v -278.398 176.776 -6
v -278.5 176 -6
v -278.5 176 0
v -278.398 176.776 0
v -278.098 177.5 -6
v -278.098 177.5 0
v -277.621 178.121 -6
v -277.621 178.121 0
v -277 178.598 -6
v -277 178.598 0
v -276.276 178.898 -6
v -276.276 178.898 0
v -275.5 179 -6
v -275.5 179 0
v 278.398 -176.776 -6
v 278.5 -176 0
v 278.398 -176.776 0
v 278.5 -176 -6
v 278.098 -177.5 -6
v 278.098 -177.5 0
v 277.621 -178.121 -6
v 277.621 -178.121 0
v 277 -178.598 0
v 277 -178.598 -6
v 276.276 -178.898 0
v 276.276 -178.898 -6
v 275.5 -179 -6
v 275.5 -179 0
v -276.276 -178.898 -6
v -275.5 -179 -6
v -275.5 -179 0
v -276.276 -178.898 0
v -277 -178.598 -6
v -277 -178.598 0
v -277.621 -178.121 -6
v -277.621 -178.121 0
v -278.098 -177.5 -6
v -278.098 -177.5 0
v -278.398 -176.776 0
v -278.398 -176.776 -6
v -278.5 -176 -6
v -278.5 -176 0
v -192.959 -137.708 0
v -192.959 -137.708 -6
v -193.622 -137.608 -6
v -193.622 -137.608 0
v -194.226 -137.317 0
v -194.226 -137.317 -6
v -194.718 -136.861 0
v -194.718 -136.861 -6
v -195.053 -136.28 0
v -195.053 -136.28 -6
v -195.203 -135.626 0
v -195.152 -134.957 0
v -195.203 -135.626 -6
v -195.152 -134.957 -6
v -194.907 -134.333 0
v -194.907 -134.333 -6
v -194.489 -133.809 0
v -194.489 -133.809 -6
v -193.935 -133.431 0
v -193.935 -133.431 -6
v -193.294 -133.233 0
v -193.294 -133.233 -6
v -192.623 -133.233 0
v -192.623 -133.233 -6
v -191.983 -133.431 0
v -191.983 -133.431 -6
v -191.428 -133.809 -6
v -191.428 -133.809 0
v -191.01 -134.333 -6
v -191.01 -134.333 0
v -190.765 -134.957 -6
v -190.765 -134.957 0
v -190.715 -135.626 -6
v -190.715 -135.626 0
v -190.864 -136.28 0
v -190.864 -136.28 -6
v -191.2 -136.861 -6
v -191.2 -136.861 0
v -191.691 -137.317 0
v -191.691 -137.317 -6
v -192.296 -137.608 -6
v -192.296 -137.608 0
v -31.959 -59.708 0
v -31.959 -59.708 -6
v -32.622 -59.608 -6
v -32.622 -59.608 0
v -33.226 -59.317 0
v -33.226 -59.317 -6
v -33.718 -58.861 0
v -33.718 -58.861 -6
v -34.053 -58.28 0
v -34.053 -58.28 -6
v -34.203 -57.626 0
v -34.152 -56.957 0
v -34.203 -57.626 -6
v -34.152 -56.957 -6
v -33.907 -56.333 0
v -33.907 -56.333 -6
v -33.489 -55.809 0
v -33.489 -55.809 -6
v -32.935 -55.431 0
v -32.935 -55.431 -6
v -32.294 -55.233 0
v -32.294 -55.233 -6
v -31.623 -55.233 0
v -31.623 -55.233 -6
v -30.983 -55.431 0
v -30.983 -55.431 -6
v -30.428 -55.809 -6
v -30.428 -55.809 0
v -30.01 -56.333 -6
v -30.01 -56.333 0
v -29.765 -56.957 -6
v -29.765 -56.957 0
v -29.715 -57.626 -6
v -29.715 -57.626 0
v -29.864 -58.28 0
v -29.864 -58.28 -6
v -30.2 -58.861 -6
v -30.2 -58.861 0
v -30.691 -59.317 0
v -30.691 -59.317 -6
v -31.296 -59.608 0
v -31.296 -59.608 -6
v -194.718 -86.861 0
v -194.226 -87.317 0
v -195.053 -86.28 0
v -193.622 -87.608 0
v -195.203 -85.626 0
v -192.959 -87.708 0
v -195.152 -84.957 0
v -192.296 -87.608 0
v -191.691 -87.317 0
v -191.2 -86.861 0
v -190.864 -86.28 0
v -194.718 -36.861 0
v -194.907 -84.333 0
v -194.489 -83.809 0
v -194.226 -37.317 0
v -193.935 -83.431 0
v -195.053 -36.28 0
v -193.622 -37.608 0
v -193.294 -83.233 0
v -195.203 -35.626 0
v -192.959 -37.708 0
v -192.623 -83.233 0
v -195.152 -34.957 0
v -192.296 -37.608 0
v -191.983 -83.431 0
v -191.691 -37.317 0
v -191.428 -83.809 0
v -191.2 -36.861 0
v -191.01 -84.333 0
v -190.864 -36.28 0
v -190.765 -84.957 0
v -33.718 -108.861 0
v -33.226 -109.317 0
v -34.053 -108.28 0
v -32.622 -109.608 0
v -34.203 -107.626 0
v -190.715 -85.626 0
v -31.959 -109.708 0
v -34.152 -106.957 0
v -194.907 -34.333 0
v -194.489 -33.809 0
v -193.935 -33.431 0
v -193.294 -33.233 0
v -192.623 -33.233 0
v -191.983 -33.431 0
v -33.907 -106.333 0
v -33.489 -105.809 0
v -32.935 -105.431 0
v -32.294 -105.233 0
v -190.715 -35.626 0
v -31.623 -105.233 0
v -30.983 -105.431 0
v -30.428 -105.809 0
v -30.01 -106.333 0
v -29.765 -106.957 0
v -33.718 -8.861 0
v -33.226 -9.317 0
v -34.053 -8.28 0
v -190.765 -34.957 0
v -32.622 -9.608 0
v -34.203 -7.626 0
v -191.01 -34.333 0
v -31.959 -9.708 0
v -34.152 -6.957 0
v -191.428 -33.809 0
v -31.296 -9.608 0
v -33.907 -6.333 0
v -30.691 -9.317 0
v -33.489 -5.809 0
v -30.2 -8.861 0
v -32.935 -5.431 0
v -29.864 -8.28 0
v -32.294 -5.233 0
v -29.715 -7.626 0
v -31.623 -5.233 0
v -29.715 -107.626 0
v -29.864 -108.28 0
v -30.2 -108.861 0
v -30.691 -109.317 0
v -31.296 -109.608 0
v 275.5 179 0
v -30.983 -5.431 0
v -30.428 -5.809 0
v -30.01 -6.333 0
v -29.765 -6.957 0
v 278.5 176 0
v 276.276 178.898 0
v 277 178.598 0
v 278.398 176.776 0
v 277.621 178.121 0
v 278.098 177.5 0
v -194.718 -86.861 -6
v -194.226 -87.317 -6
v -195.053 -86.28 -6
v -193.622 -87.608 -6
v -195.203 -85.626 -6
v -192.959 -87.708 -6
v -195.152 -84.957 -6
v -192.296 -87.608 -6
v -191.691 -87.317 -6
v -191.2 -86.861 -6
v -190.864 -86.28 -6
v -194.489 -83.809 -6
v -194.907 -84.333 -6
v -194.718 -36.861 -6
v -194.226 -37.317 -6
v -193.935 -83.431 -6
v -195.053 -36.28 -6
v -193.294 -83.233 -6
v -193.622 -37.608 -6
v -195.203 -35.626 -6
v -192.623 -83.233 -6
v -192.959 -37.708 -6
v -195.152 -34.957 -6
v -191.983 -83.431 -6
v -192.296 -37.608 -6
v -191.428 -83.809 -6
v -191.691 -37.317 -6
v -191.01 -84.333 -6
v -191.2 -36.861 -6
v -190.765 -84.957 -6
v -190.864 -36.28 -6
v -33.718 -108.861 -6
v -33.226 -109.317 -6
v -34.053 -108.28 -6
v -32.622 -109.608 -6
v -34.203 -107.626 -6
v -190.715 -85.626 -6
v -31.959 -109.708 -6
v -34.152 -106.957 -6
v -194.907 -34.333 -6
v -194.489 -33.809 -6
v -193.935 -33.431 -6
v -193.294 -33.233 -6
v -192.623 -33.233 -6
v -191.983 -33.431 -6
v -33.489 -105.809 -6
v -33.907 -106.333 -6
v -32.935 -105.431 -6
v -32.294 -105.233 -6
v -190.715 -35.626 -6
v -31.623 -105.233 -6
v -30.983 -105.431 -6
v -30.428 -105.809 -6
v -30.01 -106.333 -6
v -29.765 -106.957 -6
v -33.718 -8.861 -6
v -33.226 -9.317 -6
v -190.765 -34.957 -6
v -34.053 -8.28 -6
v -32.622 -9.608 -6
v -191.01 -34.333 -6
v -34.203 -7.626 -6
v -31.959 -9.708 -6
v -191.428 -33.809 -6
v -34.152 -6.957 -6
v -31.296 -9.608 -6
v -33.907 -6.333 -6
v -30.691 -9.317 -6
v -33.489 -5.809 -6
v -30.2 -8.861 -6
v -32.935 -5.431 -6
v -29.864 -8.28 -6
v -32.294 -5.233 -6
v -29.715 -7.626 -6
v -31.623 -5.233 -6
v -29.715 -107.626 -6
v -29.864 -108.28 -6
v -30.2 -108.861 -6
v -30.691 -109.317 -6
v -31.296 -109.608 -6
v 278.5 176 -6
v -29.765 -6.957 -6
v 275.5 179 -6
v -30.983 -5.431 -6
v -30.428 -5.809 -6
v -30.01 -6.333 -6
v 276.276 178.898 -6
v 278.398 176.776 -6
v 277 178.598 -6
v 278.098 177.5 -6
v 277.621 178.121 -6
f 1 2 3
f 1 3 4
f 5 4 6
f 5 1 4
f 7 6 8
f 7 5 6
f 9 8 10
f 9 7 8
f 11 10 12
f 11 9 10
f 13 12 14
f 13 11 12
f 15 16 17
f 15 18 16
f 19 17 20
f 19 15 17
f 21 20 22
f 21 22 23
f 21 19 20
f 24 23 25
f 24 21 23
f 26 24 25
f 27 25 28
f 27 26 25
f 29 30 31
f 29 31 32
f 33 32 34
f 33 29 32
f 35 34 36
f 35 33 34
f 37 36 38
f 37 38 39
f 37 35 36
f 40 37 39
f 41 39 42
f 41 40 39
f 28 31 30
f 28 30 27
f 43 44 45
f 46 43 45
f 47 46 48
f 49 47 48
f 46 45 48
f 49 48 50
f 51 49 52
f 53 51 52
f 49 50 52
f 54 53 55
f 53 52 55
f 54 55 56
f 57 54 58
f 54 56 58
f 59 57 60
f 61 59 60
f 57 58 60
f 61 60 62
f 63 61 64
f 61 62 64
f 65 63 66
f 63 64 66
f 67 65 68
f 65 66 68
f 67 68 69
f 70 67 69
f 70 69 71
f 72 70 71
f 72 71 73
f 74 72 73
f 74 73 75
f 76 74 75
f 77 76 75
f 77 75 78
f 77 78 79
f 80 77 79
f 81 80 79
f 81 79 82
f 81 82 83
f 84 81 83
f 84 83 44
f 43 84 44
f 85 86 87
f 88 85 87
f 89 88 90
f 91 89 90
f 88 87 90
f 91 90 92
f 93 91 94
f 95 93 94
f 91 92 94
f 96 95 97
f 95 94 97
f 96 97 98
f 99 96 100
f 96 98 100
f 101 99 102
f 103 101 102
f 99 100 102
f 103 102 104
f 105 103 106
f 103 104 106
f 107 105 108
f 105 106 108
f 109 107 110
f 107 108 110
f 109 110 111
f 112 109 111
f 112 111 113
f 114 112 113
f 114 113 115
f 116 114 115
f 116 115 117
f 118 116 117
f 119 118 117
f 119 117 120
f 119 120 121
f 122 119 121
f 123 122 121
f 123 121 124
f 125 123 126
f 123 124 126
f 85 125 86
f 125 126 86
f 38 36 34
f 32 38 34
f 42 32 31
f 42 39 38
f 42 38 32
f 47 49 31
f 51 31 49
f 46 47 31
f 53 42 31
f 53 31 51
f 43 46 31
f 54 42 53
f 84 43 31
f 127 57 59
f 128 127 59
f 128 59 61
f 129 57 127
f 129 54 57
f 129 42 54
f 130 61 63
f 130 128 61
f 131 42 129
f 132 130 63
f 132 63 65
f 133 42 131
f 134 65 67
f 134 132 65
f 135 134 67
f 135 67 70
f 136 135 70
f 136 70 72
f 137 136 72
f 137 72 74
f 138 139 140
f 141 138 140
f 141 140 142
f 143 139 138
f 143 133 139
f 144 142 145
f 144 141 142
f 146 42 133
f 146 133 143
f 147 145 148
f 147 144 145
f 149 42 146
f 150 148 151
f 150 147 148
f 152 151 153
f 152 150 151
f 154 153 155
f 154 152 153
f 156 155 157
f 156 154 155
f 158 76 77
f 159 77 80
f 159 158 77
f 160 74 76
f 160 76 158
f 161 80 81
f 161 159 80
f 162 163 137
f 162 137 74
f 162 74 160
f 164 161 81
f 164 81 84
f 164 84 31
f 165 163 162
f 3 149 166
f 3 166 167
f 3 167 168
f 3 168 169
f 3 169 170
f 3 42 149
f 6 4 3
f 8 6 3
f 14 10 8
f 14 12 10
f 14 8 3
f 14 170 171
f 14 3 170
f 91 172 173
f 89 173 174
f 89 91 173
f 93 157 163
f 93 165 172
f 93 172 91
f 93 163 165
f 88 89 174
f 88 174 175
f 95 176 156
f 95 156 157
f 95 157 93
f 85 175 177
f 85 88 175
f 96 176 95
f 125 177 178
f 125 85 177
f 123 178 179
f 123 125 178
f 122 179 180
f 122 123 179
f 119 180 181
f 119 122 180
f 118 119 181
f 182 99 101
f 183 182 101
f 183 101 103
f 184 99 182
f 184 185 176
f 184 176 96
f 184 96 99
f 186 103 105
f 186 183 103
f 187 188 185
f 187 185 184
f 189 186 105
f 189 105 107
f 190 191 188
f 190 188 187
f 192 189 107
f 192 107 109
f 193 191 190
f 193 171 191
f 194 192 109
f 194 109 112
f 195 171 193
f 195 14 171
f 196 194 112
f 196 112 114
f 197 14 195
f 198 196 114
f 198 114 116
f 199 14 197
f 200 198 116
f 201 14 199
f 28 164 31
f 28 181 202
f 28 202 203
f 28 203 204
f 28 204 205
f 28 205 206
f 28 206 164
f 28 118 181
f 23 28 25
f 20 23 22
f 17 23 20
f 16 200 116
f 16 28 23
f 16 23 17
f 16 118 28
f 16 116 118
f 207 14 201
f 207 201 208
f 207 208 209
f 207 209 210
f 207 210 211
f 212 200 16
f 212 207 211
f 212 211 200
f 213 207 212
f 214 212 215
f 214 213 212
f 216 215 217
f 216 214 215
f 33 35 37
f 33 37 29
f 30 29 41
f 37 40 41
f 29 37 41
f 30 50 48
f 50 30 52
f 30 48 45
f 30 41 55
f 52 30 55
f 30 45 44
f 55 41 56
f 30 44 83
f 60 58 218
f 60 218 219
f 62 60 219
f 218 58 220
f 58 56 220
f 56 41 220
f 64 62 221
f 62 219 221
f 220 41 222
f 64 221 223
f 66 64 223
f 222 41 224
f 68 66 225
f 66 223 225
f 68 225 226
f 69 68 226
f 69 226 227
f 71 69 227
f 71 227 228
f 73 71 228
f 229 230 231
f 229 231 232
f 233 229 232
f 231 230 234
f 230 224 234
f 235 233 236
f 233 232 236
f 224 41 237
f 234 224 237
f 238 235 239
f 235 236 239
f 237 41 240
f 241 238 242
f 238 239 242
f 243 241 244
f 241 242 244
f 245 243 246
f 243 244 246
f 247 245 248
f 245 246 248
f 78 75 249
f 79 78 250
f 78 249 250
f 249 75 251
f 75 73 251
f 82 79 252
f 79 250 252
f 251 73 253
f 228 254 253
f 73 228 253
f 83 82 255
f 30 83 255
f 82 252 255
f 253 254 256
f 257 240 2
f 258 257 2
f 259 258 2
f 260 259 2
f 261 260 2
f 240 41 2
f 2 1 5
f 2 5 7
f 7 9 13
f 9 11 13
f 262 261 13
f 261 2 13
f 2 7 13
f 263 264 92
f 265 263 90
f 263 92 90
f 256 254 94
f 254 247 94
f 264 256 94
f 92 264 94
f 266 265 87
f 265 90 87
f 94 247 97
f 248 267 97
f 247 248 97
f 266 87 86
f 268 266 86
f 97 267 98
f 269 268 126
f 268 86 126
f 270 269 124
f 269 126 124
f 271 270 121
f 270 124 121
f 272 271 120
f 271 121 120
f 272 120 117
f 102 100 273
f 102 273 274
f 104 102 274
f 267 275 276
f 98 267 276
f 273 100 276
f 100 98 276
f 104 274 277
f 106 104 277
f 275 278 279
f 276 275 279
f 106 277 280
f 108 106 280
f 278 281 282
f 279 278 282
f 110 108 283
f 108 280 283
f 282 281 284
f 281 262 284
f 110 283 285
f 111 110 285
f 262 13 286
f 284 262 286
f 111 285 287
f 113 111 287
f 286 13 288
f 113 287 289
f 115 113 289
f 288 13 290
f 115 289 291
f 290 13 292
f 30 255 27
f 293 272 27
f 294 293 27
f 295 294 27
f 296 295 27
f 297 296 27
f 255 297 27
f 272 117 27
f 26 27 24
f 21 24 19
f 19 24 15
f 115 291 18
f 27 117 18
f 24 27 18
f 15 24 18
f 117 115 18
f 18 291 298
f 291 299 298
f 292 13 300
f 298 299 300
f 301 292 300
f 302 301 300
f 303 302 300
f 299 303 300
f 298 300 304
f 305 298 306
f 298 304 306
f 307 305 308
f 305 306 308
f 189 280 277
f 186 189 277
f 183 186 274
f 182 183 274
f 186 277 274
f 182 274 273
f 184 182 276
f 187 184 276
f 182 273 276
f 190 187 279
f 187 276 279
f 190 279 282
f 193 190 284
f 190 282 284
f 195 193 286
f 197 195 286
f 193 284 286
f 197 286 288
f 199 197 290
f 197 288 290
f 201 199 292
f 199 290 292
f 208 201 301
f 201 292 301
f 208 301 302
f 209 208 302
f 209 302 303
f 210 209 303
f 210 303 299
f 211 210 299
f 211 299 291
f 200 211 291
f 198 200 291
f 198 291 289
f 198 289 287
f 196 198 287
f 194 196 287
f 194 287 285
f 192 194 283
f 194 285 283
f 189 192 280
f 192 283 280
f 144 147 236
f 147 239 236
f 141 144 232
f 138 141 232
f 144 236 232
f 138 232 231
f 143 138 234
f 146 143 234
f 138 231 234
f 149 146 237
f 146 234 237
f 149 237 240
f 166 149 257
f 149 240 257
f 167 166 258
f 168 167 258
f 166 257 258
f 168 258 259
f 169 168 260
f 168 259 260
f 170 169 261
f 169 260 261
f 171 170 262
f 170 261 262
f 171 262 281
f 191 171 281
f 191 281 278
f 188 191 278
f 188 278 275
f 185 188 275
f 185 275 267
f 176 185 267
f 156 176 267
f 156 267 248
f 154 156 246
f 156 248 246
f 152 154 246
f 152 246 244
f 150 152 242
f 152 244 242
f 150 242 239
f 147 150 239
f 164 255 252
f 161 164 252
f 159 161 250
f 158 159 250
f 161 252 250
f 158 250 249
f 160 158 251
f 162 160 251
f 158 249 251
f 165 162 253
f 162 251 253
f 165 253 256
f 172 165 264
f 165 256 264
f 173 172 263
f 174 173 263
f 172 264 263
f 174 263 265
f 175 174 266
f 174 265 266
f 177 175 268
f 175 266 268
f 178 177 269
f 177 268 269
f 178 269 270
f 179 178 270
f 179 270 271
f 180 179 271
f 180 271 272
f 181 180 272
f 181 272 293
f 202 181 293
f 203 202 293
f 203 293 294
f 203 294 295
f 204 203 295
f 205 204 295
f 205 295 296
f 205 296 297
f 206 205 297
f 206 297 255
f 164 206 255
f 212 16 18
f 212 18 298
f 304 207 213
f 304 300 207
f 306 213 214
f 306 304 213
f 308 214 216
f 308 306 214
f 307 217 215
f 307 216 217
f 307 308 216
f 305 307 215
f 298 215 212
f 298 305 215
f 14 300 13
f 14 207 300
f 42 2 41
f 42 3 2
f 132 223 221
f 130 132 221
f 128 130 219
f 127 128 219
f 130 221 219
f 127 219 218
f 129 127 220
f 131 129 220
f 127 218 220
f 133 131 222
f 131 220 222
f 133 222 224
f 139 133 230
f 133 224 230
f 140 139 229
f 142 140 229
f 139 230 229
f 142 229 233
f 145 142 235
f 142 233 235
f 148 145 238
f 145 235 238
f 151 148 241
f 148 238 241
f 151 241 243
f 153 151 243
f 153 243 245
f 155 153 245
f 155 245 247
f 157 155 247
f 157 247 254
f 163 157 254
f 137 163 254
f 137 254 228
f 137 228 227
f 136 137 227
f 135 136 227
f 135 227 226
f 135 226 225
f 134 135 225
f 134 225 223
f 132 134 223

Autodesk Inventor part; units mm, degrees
ref_plane "YZ Plane" through (0, 0, 0) normal (1, 0, 0) x (0, 1, 0)
ref_plane "XZ Plane" through (0, 0, 0) normal (0, 1, 0) x (-1, 0, 0)
ref_plane "XY Plane" through (0, 0, 0) normal (0, 0, 1) x (1, 0, 0)
sketch "Sketch2" plane through (0, 0, 0) normal (0, 0, 1) x (1, 0, 0)
  line L0 (278.5, 179) -> (-278.5, 179)
  line L1 (-278.5, 179) -> (-278.5, -179)
  line L2 (-278.5, -179) -> (278.5, -179)
  line L3 (278.5, -179) -> (278.5, 179)
  line L4 (278.5, 179) -> (-278.5, -179) construction
  line L5 (-278.5, 179) -> (278.5, -179) construction
  point P0 (0, 0)
  dimension "d0" = 557
  dimension "d1" = 358
extrude "Extrusion1" add sketch "Sketch2" against normal blind 6
fillet "Fillet1" radius 3 4 edges at (-278.5, -179, -3) (-278.5, 179, -3) (278.5, -179, -3) (278.5, 179, -3)
sketch "Sketch3" plane through (0, 0, 0) normal (0, 0, 1) x (1, 0, 0)
  line L0 (-192.9588, -135.4581) -> (-192.9588, -85.4581) construction
  line L1 (-192.9588, -85.4581) -> (-192.9588, -35.4581) construction
  line L2 (-192.9588, -135.4581) -> (-31.9588, -107.4581) construction
  line L3 (-192.9588, -85.4581) -> (-31.9588, -57.4581) construction
  line L4 (-192.9588, -35.4581) -> (-31.9588, -7.4581) construction
  line L5 (-197.4588, -141.4581) -> (-27.4588, -141.4581)
  line L6 (-27.4588, -141.4581) -> (-27.4588, -101.4581)
  line L7 (-27.4588, -101.4581) -> (-197.4588, -101.4581)
  line L8 (-197.4588, -101.4581) -> (-197.4588, -141.4581)
  line L9 (-197.4588, -141.4581) -> (-27.4588, -101.4581) construction
  line L10 (-27.4588, -141.4581) -> (-197.4588, -101.4581) construction
  line L11 (-197.4588, -91.4581) -> (-27.4588, -91.4581)
  line L12 (-27.4588, -91.4581) -> (-27.4588, -51.4581)
  line L13 (-27.4588, -51.4581) -> (-197.4588, -51.4581)
  line L14 (-197.4588, -51.4581) -> (-197.4588, -91.4581)
  line L15 (-197.4588, -91.4581) -> (-27.4588, -51.4581) construction
  line L16 (-27.4588, -91.4581) -> (-197.4588, -51.4581) construction
  line L17 (-197.4588, -41.4581) -> (-27.4588, -41.4581)
  line L18 (-27.4588, -41.4581) -> (-27.4588, -1.4581)
  line L19 (-27.4588, -1.4581) -> (-197.4588, -1.4581)
  line L20 (-197.4588, -1.4581) -> (-197.4588, -41.4581)
  line L21 (-197.4588, -41.4581) -> (-27.4588, -1.4581) construction
  line L22 (-27.4588, -41.4581) -> (-197.4588, -1.4581) construction
  line L23 (22.5412, -161.4581) -> (-247.4588, -161.4581)
  line L24 (-247.4588, -161.4581) -> (-247.4588, 18.5419)
  line L25 (-247.4588, 18.5419) -> (22.5412, 18.5419)
  line L26 (22.5412, 18.5419) -> (22.5412, -161.4581)
  line L27 (22.5412, -161.4581) -> (-247.4588, 18.5419) construction
  line L28 (-247.4588, -161.4581) -> (22.5412, 18.5419) construction
  point P0 (0, 0)
  point P1 (-112.4588, -121.4581)
  point P2 (-112.4588, -71.4581)
  point P3 (-112.4588, -21.4581)
  dimension "d12" = 28
  dimension "d13" = 161
  dimension "d14" = 161
  dimension "d15" = 28
  dimension "d16" = 28
  dimension "d17" = 161
  dimension "d18" = 50
  dimension "d19" = 50
  dimension "d20" = 170
  dimension "d21" = 40
  dimension "d22" = 170
  dimension "d23" = 40
  dimension "d24" = 170
  dimension "d25" = 40
  dimension "d26" = 20
  dimension "d27" = 50
hole "Hole1" at (-192.9588, -135.4581, 0) at (-31.9588, -107.4581, 0) at (-192.9588, -85.4581, 0) at (-31.9588, -7.4581, 0) at (-31.9588, -57.4581, 0) at (-192.9588, -35.4581, 0) direction (0, 0, -1) diameter 4.5 end through all clearance for "Flat Head Machine Screw" size "M4" standard "Ansi Metric M Profile"
properties part number "TB_FRM_MC_001_BasePlate"
